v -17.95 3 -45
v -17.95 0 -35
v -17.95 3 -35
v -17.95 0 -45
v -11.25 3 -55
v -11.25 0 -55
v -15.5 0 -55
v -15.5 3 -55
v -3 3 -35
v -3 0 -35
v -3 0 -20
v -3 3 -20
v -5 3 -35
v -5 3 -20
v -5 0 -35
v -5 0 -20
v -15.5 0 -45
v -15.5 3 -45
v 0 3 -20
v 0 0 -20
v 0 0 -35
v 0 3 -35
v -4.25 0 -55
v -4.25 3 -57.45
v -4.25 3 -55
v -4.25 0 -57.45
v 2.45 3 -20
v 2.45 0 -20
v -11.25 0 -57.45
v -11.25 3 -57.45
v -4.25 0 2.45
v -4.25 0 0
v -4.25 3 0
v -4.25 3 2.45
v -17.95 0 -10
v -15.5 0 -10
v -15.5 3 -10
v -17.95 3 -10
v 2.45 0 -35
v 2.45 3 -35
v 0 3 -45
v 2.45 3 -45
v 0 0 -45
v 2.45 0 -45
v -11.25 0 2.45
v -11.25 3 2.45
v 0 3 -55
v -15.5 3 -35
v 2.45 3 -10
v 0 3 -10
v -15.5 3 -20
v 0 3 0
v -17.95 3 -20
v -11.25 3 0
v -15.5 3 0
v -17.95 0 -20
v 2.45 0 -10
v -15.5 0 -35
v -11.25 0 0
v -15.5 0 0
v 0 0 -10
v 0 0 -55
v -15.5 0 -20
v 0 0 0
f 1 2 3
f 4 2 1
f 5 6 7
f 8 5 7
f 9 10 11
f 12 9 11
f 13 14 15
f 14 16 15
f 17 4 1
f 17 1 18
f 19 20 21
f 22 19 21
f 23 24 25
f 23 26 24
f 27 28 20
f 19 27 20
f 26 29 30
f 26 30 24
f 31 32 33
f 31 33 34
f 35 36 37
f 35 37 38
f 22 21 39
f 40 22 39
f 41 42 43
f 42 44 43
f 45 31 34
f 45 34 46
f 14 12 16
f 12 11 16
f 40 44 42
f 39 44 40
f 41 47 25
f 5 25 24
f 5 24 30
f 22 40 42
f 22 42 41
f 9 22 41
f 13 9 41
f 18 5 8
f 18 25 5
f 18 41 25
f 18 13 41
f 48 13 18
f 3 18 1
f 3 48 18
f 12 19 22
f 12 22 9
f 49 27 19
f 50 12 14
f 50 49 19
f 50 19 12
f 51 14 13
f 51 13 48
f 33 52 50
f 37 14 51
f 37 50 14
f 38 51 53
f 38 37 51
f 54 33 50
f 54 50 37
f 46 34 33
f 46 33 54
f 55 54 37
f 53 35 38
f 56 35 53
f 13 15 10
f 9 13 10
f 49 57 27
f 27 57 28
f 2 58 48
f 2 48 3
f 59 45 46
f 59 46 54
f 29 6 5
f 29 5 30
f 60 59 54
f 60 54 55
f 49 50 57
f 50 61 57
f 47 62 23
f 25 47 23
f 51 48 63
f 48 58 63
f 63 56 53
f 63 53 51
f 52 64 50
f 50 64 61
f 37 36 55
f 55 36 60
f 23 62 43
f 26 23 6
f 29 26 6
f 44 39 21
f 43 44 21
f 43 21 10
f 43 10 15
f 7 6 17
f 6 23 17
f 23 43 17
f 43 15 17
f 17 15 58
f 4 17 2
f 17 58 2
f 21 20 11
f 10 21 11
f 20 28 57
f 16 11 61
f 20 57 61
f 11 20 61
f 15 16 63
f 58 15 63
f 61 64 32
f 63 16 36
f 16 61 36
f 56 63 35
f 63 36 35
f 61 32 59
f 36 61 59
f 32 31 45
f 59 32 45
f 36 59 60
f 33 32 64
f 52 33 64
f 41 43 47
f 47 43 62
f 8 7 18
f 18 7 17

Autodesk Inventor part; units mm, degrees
ref_plane "YZ Plane" through (0, 0, 0) normal (1, 0, 0) x (0, 1, 0)
ref_plane "XZ Plane" through (0, 0, 0) normal (0, 1, 0) x (-1, 0, 0)
ref_plane "XY Plane" through (0, 0, 0) normal (0, 0, 1) x (1, 0, 0)
sketch "Sketch1" plane through (0, 0, 0) normal (0, 1, 0) x (-1, 0, 0)
  line L0 (7.75, -19.9274) -> (7.75, -42.3236) construction
  line L1 (13.2323, -27.5) -> (6.4845, -27.5) construction
  line L2 (15.5, -10) -> (17.95, -10)
  line L3 (17.95, -10) -> (17.95, -20)
  line L4 (17.95, -20) -> (15.5, -20)
  line L5 (15.5, -35) -> (17.95, -35)
  line L6 (17.95, -35) -> (17.95, -45)
  line L7 (17.95, -45) -> (15.5, -45)
  line L8 (0, -10) -> (-2.45, -10)
  line L9 (-2.45, -10) -> (-2.45, -20)
  line L10 (-2.45, -20) -> (0, -20)
  line L11 (0, -35) -> (-2.45, -35)
  line L12 (-2.45, -45) -> (0, -45)
  line L13 (-2.45, -45) -> (-2.45, -35)
  line L14 (15.5, -10) -> (15.5, 0)
  line L15 (15.5, -55) -> (15.5, -45)
  line L16 (15.5, -35) -> (15.5, -20)
  line L17 (0, 0) -> (0, -10)
  line L18 (0, -20) -> (0, -35)
  line L19 (0, -45) -> (0, -55)
  line L20 (4.25, 0) -> (0, 0)
  line L21 (0, -55) -> (4.25, -55)
  line L22 (11.25, -55) -> (15.5, -55)
  line L23 (4.25, 0) -> (4.25, 2.45)
  line L24 (4.25, 2.45) -> (11.25, 2.45)
  line L25 (11.25, 2.45) -> (11.25, 0)
  line L26 (11.25, 0) -> (15.5, 0)
  line L27 (11.25, -55) -> (11.25, -57.45)
  line L28 (11.25, -57.45) -> (4.25, -57.45)
  line L29 (4.25, -57.45) -> (4.25, -55)
  line L30 (5, -35) -> (3, -35)
  line L31 (3, -35) -> (3, -20)
  line L32 (3, -20) -> (5, -20)
  line L33 (5, -20) -> (5, -35)
  dimension "d8" = 10
  dimension "d9" = 15
  dimension "d10" = 15.5
  dimension "d17" = 2.45
  dimension "d19" = 7
  dimension "d20" = 55
  dimension "d21" = 3
  dimension "d22" = 15
  dimension "d23" = 2
extrude "Extrusion1" add sketch "Sketch1" along normal blind 3
properties part number "Front_wall"
